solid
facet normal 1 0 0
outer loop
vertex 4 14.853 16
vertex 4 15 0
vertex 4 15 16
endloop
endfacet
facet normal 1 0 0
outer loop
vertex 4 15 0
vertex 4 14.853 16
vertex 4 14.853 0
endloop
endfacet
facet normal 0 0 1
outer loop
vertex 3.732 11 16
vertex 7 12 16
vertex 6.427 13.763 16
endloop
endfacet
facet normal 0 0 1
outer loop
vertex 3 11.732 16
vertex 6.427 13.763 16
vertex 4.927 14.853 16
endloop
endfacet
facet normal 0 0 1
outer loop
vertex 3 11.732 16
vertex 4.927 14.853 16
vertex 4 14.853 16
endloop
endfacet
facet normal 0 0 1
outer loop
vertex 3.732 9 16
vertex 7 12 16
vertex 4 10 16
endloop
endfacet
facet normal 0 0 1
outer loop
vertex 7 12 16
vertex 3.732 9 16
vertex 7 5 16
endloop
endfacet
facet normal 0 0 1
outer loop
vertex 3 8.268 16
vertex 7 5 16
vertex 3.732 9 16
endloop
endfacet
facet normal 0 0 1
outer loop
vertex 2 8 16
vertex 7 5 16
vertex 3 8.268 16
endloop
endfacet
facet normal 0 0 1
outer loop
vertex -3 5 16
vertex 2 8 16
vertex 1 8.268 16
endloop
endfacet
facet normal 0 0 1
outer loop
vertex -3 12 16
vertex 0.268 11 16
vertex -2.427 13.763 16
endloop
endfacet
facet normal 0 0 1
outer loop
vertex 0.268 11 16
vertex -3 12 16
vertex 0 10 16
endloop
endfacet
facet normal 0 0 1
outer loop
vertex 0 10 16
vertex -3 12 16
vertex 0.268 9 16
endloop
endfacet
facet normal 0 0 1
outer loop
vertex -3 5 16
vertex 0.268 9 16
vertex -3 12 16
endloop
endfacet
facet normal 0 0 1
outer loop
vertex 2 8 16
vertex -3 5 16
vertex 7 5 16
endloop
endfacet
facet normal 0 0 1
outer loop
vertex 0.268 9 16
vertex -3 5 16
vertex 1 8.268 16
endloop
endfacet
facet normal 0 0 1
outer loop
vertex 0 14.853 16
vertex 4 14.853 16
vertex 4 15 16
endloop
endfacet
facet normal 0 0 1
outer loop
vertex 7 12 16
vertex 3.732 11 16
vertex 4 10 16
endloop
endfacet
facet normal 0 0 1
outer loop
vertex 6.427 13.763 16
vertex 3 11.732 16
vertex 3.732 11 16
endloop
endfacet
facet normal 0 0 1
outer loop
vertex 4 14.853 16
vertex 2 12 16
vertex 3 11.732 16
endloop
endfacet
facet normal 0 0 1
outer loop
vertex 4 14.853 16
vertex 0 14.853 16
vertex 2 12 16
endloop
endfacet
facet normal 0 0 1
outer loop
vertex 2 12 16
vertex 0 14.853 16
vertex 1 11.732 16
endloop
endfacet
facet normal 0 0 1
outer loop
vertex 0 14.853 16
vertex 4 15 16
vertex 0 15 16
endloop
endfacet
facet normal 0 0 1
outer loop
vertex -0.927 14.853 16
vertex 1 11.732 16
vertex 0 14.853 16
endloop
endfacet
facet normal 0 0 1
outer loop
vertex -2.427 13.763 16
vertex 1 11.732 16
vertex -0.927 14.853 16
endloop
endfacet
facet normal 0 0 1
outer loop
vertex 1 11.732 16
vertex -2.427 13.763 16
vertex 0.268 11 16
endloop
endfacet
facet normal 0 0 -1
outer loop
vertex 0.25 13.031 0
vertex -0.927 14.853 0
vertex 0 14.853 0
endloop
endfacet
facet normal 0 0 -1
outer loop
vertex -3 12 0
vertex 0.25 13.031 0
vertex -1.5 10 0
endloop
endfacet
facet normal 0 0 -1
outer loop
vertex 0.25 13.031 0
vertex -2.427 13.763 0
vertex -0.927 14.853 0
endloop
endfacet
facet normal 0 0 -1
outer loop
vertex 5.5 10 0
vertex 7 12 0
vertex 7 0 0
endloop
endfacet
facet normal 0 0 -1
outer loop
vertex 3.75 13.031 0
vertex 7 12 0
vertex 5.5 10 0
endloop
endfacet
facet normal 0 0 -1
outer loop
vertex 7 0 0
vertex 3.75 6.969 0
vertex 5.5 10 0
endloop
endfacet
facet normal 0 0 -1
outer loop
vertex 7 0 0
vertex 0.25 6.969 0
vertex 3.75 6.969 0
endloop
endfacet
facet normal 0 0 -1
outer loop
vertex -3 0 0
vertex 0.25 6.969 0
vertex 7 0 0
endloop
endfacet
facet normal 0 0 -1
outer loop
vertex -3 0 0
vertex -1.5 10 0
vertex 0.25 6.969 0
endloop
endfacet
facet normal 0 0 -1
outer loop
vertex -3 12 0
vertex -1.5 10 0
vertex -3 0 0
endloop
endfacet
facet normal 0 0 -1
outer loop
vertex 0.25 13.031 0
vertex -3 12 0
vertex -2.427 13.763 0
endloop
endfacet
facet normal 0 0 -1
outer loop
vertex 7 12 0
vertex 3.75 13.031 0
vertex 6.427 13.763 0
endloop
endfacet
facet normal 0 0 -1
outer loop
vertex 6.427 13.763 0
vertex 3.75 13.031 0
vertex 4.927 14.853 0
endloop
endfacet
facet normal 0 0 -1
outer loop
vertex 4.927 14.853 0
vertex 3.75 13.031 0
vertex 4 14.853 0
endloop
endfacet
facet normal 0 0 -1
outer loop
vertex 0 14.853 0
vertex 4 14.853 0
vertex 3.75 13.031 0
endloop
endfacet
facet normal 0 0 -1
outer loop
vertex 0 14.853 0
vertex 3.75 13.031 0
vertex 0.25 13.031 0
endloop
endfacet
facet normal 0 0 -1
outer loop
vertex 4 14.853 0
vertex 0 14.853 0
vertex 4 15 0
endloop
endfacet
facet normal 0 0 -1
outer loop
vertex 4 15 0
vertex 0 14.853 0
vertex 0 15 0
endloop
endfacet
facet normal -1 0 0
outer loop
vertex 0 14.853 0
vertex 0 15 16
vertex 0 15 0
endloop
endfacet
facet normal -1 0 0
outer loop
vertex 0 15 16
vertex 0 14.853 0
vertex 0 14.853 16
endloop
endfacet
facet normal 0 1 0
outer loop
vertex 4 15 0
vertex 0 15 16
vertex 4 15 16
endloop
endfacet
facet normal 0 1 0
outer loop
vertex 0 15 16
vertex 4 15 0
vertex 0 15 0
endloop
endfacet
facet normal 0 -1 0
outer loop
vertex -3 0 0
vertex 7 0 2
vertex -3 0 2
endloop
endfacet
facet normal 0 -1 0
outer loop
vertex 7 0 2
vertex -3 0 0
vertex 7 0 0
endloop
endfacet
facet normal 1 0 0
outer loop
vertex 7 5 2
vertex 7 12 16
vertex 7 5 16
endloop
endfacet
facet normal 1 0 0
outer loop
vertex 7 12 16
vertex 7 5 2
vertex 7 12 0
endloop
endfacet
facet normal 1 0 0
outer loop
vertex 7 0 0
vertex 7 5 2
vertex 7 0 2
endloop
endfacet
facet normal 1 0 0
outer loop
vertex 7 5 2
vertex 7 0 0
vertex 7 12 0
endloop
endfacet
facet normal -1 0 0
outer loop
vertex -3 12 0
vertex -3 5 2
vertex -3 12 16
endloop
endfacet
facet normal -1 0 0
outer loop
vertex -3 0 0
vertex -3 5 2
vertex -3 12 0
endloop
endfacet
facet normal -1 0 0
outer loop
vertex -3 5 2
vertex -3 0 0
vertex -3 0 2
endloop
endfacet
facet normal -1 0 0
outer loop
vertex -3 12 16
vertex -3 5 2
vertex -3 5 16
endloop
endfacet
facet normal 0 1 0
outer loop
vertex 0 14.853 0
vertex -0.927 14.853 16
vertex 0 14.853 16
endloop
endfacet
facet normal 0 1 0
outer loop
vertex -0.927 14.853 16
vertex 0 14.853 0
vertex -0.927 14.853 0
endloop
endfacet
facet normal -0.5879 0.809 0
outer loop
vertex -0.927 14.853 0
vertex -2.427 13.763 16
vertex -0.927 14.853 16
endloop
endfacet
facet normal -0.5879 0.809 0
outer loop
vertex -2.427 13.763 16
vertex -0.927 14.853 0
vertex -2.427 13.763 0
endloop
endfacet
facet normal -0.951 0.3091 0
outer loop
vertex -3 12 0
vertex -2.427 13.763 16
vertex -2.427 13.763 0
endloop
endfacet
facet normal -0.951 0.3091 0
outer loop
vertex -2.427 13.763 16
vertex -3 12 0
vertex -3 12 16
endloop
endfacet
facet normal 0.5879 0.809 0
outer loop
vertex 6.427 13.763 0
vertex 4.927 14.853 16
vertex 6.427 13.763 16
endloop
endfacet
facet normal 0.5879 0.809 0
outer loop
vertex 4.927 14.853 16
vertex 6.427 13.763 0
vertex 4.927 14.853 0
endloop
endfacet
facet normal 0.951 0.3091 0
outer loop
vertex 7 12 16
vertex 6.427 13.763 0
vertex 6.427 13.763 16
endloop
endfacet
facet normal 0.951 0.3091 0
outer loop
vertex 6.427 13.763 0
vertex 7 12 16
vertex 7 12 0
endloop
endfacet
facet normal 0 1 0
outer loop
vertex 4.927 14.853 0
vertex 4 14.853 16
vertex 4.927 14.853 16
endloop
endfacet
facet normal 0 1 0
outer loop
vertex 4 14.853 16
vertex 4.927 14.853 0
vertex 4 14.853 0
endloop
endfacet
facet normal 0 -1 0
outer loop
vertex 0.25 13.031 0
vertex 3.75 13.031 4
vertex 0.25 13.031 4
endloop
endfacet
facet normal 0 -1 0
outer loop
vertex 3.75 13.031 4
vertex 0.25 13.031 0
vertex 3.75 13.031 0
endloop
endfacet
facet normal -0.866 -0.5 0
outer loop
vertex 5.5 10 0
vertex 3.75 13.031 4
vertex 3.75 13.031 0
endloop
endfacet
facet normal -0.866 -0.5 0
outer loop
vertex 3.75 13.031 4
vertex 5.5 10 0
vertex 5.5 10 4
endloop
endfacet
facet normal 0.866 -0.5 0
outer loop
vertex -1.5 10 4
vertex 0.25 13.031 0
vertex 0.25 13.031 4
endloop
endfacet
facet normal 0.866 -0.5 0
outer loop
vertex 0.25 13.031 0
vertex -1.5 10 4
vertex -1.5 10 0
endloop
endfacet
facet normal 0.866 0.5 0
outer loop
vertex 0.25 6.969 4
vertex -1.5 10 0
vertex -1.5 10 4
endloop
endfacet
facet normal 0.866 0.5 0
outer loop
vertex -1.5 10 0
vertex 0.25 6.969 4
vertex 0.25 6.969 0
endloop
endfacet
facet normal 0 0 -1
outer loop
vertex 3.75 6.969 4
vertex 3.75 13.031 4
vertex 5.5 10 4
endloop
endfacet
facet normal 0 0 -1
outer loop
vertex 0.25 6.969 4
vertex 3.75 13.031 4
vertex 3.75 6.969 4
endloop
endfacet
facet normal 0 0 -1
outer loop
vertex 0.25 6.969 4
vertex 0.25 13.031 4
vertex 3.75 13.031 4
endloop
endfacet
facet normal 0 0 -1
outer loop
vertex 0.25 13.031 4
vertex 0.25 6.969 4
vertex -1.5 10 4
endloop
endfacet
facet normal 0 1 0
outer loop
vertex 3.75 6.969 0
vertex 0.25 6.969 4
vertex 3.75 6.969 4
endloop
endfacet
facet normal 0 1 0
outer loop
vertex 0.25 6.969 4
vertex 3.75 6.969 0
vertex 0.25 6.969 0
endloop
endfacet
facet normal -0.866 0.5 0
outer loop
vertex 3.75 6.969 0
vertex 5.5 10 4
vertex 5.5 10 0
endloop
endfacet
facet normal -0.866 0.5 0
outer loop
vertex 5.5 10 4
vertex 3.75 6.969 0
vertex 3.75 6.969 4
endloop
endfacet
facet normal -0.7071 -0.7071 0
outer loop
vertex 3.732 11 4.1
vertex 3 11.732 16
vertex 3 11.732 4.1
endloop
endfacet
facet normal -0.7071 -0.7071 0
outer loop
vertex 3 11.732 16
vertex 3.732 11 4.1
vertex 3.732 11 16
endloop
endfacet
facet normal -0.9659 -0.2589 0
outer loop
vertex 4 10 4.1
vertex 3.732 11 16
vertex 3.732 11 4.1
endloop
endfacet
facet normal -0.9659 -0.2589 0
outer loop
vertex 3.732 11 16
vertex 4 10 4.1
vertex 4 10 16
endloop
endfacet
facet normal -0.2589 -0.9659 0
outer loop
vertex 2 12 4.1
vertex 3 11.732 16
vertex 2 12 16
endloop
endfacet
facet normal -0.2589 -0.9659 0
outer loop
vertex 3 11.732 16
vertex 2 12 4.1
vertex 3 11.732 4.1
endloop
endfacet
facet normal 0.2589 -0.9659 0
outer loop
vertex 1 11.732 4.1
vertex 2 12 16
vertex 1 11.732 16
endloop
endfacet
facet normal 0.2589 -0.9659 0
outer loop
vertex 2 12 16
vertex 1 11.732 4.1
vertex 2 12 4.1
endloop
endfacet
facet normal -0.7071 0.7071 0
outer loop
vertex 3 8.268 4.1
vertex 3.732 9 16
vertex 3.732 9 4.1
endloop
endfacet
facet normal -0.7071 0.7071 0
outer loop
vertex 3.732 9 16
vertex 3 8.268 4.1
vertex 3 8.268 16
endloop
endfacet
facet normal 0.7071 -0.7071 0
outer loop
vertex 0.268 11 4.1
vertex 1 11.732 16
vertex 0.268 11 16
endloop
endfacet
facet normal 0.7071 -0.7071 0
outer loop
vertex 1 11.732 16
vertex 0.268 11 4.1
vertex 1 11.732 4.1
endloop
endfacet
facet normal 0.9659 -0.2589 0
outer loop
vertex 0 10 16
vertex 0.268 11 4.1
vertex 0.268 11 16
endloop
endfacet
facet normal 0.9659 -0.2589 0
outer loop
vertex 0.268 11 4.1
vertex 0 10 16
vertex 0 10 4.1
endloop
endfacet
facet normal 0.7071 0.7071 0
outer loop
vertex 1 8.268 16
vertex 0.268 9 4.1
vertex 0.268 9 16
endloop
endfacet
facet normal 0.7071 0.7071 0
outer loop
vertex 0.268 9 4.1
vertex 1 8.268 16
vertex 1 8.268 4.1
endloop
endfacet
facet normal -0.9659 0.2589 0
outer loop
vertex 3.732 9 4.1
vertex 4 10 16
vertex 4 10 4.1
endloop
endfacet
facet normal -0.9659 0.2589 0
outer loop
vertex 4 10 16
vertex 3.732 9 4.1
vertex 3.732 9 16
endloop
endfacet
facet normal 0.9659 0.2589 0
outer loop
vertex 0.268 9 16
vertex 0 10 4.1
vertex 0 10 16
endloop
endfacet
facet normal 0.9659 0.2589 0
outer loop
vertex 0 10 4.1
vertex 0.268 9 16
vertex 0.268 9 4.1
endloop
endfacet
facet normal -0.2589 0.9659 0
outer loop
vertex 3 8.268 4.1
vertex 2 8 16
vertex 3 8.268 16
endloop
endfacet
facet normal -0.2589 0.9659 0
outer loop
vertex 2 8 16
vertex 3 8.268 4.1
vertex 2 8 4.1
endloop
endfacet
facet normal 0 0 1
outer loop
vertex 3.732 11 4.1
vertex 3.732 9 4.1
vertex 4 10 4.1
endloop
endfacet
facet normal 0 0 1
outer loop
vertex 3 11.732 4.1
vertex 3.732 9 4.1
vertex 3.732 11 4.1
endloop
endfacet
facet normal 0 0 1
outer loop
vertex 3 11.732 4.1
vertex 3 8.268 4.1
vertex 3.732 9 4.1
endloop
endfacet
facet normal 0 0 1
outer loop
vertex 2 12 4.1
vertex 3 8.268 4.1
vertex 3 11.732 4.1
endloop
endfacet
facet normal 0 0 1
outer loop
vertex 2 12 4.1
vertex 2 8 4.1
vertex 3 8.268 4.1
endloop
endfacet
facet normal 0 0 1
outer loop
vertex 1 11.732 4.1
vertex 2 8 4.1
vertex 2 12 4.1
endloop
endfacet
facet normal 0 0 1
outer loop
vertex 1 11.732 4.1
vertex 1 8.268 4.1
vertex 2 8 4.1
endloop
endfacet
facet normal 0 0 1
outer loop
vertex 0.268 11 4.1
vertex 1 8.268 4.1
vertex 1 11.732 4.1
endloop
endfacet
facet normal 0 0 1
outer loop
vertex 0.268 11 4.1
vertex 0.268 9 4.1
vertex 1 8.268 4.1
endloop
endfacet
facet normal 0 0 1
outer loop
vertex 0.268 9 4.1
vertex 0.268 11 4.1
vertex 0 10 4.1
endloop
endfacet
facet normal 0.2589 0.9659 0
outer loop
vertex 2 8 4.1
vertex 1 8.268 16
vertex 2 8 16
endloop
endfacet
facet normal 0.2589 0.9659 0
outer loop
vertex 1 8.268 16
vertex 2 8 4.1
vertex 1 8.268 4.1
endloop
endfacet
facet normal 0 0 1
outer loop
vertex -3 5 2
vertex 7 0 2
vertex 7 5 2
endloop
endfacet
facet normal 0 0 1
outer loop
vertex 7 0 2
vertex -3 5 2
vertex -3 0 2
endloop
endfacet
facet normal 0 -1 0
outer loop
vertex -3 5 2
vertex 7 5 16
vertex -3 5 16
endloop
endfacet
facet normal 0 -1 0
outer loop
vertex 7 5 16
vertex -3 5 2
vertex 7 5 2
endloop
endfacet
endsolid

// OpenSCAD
//Enter OpenSCAD code here.
 echo("Version:",version());

dist_dal_bordo      =   5;
dim_lingua          =   5;
altezza             =   16;
larghezza           =   10;
raggio_smusso       =   3; // deve essere minore di larghezza/2
spessore_lingua     =   2;
altezza_tasca_dado  =   4;

prof= 2* dist_dal_bordo + dim_lingua ;

difference ()
{
  union ()  //ingombro totale 
  {   
    cube([ larghezza-2*raggio_smusso , prof, altezza]);
    
    translate ([ larghezza-2*raggio_smusso ,0,0]) 
      cube([ raggio_smusso ,prof-raggio_smusso,altezza]);
    
    translate ([ -raggio_smusso , 0,0]) 
      cube([ raggio_smusso ,prof-raggio_smusso,altezza]);

    translate ([ 0, prof-raggio_smusso ,0]) 
      cylinder (r=raggio_smusso , h= altezza);
    translate ([ larghezza -2*raggio_smusso , prof-raggio_smusso ,0]) 
      cylinder (r=raggio_smusso , h= altezza);
  }
  
  //sottratti dall ingombro
  //tasca per il dado
  translate([ larghezza/2-raggio_smusso,dist_dal_bordo+dim_lingua, 0]) 
    cylinder ( r=3.5,h=altezza_tasca_dado,$fn=6);
  
  
  //foro vite 
  
  translate([ larghezza/2-raggio_smusso,dist_dal_bordo+dim_lingua, altezza_tasca_dado+0.10]) 
    cylinder ( r=2 ,h=altezza,$fn=12);

  //scasso per lingua ..
   translate ([-raggio_smusso, 0,spessore_lingua])
          cube ([larghezza,dim_lingua,altezza-spessore_lingua]);

}
